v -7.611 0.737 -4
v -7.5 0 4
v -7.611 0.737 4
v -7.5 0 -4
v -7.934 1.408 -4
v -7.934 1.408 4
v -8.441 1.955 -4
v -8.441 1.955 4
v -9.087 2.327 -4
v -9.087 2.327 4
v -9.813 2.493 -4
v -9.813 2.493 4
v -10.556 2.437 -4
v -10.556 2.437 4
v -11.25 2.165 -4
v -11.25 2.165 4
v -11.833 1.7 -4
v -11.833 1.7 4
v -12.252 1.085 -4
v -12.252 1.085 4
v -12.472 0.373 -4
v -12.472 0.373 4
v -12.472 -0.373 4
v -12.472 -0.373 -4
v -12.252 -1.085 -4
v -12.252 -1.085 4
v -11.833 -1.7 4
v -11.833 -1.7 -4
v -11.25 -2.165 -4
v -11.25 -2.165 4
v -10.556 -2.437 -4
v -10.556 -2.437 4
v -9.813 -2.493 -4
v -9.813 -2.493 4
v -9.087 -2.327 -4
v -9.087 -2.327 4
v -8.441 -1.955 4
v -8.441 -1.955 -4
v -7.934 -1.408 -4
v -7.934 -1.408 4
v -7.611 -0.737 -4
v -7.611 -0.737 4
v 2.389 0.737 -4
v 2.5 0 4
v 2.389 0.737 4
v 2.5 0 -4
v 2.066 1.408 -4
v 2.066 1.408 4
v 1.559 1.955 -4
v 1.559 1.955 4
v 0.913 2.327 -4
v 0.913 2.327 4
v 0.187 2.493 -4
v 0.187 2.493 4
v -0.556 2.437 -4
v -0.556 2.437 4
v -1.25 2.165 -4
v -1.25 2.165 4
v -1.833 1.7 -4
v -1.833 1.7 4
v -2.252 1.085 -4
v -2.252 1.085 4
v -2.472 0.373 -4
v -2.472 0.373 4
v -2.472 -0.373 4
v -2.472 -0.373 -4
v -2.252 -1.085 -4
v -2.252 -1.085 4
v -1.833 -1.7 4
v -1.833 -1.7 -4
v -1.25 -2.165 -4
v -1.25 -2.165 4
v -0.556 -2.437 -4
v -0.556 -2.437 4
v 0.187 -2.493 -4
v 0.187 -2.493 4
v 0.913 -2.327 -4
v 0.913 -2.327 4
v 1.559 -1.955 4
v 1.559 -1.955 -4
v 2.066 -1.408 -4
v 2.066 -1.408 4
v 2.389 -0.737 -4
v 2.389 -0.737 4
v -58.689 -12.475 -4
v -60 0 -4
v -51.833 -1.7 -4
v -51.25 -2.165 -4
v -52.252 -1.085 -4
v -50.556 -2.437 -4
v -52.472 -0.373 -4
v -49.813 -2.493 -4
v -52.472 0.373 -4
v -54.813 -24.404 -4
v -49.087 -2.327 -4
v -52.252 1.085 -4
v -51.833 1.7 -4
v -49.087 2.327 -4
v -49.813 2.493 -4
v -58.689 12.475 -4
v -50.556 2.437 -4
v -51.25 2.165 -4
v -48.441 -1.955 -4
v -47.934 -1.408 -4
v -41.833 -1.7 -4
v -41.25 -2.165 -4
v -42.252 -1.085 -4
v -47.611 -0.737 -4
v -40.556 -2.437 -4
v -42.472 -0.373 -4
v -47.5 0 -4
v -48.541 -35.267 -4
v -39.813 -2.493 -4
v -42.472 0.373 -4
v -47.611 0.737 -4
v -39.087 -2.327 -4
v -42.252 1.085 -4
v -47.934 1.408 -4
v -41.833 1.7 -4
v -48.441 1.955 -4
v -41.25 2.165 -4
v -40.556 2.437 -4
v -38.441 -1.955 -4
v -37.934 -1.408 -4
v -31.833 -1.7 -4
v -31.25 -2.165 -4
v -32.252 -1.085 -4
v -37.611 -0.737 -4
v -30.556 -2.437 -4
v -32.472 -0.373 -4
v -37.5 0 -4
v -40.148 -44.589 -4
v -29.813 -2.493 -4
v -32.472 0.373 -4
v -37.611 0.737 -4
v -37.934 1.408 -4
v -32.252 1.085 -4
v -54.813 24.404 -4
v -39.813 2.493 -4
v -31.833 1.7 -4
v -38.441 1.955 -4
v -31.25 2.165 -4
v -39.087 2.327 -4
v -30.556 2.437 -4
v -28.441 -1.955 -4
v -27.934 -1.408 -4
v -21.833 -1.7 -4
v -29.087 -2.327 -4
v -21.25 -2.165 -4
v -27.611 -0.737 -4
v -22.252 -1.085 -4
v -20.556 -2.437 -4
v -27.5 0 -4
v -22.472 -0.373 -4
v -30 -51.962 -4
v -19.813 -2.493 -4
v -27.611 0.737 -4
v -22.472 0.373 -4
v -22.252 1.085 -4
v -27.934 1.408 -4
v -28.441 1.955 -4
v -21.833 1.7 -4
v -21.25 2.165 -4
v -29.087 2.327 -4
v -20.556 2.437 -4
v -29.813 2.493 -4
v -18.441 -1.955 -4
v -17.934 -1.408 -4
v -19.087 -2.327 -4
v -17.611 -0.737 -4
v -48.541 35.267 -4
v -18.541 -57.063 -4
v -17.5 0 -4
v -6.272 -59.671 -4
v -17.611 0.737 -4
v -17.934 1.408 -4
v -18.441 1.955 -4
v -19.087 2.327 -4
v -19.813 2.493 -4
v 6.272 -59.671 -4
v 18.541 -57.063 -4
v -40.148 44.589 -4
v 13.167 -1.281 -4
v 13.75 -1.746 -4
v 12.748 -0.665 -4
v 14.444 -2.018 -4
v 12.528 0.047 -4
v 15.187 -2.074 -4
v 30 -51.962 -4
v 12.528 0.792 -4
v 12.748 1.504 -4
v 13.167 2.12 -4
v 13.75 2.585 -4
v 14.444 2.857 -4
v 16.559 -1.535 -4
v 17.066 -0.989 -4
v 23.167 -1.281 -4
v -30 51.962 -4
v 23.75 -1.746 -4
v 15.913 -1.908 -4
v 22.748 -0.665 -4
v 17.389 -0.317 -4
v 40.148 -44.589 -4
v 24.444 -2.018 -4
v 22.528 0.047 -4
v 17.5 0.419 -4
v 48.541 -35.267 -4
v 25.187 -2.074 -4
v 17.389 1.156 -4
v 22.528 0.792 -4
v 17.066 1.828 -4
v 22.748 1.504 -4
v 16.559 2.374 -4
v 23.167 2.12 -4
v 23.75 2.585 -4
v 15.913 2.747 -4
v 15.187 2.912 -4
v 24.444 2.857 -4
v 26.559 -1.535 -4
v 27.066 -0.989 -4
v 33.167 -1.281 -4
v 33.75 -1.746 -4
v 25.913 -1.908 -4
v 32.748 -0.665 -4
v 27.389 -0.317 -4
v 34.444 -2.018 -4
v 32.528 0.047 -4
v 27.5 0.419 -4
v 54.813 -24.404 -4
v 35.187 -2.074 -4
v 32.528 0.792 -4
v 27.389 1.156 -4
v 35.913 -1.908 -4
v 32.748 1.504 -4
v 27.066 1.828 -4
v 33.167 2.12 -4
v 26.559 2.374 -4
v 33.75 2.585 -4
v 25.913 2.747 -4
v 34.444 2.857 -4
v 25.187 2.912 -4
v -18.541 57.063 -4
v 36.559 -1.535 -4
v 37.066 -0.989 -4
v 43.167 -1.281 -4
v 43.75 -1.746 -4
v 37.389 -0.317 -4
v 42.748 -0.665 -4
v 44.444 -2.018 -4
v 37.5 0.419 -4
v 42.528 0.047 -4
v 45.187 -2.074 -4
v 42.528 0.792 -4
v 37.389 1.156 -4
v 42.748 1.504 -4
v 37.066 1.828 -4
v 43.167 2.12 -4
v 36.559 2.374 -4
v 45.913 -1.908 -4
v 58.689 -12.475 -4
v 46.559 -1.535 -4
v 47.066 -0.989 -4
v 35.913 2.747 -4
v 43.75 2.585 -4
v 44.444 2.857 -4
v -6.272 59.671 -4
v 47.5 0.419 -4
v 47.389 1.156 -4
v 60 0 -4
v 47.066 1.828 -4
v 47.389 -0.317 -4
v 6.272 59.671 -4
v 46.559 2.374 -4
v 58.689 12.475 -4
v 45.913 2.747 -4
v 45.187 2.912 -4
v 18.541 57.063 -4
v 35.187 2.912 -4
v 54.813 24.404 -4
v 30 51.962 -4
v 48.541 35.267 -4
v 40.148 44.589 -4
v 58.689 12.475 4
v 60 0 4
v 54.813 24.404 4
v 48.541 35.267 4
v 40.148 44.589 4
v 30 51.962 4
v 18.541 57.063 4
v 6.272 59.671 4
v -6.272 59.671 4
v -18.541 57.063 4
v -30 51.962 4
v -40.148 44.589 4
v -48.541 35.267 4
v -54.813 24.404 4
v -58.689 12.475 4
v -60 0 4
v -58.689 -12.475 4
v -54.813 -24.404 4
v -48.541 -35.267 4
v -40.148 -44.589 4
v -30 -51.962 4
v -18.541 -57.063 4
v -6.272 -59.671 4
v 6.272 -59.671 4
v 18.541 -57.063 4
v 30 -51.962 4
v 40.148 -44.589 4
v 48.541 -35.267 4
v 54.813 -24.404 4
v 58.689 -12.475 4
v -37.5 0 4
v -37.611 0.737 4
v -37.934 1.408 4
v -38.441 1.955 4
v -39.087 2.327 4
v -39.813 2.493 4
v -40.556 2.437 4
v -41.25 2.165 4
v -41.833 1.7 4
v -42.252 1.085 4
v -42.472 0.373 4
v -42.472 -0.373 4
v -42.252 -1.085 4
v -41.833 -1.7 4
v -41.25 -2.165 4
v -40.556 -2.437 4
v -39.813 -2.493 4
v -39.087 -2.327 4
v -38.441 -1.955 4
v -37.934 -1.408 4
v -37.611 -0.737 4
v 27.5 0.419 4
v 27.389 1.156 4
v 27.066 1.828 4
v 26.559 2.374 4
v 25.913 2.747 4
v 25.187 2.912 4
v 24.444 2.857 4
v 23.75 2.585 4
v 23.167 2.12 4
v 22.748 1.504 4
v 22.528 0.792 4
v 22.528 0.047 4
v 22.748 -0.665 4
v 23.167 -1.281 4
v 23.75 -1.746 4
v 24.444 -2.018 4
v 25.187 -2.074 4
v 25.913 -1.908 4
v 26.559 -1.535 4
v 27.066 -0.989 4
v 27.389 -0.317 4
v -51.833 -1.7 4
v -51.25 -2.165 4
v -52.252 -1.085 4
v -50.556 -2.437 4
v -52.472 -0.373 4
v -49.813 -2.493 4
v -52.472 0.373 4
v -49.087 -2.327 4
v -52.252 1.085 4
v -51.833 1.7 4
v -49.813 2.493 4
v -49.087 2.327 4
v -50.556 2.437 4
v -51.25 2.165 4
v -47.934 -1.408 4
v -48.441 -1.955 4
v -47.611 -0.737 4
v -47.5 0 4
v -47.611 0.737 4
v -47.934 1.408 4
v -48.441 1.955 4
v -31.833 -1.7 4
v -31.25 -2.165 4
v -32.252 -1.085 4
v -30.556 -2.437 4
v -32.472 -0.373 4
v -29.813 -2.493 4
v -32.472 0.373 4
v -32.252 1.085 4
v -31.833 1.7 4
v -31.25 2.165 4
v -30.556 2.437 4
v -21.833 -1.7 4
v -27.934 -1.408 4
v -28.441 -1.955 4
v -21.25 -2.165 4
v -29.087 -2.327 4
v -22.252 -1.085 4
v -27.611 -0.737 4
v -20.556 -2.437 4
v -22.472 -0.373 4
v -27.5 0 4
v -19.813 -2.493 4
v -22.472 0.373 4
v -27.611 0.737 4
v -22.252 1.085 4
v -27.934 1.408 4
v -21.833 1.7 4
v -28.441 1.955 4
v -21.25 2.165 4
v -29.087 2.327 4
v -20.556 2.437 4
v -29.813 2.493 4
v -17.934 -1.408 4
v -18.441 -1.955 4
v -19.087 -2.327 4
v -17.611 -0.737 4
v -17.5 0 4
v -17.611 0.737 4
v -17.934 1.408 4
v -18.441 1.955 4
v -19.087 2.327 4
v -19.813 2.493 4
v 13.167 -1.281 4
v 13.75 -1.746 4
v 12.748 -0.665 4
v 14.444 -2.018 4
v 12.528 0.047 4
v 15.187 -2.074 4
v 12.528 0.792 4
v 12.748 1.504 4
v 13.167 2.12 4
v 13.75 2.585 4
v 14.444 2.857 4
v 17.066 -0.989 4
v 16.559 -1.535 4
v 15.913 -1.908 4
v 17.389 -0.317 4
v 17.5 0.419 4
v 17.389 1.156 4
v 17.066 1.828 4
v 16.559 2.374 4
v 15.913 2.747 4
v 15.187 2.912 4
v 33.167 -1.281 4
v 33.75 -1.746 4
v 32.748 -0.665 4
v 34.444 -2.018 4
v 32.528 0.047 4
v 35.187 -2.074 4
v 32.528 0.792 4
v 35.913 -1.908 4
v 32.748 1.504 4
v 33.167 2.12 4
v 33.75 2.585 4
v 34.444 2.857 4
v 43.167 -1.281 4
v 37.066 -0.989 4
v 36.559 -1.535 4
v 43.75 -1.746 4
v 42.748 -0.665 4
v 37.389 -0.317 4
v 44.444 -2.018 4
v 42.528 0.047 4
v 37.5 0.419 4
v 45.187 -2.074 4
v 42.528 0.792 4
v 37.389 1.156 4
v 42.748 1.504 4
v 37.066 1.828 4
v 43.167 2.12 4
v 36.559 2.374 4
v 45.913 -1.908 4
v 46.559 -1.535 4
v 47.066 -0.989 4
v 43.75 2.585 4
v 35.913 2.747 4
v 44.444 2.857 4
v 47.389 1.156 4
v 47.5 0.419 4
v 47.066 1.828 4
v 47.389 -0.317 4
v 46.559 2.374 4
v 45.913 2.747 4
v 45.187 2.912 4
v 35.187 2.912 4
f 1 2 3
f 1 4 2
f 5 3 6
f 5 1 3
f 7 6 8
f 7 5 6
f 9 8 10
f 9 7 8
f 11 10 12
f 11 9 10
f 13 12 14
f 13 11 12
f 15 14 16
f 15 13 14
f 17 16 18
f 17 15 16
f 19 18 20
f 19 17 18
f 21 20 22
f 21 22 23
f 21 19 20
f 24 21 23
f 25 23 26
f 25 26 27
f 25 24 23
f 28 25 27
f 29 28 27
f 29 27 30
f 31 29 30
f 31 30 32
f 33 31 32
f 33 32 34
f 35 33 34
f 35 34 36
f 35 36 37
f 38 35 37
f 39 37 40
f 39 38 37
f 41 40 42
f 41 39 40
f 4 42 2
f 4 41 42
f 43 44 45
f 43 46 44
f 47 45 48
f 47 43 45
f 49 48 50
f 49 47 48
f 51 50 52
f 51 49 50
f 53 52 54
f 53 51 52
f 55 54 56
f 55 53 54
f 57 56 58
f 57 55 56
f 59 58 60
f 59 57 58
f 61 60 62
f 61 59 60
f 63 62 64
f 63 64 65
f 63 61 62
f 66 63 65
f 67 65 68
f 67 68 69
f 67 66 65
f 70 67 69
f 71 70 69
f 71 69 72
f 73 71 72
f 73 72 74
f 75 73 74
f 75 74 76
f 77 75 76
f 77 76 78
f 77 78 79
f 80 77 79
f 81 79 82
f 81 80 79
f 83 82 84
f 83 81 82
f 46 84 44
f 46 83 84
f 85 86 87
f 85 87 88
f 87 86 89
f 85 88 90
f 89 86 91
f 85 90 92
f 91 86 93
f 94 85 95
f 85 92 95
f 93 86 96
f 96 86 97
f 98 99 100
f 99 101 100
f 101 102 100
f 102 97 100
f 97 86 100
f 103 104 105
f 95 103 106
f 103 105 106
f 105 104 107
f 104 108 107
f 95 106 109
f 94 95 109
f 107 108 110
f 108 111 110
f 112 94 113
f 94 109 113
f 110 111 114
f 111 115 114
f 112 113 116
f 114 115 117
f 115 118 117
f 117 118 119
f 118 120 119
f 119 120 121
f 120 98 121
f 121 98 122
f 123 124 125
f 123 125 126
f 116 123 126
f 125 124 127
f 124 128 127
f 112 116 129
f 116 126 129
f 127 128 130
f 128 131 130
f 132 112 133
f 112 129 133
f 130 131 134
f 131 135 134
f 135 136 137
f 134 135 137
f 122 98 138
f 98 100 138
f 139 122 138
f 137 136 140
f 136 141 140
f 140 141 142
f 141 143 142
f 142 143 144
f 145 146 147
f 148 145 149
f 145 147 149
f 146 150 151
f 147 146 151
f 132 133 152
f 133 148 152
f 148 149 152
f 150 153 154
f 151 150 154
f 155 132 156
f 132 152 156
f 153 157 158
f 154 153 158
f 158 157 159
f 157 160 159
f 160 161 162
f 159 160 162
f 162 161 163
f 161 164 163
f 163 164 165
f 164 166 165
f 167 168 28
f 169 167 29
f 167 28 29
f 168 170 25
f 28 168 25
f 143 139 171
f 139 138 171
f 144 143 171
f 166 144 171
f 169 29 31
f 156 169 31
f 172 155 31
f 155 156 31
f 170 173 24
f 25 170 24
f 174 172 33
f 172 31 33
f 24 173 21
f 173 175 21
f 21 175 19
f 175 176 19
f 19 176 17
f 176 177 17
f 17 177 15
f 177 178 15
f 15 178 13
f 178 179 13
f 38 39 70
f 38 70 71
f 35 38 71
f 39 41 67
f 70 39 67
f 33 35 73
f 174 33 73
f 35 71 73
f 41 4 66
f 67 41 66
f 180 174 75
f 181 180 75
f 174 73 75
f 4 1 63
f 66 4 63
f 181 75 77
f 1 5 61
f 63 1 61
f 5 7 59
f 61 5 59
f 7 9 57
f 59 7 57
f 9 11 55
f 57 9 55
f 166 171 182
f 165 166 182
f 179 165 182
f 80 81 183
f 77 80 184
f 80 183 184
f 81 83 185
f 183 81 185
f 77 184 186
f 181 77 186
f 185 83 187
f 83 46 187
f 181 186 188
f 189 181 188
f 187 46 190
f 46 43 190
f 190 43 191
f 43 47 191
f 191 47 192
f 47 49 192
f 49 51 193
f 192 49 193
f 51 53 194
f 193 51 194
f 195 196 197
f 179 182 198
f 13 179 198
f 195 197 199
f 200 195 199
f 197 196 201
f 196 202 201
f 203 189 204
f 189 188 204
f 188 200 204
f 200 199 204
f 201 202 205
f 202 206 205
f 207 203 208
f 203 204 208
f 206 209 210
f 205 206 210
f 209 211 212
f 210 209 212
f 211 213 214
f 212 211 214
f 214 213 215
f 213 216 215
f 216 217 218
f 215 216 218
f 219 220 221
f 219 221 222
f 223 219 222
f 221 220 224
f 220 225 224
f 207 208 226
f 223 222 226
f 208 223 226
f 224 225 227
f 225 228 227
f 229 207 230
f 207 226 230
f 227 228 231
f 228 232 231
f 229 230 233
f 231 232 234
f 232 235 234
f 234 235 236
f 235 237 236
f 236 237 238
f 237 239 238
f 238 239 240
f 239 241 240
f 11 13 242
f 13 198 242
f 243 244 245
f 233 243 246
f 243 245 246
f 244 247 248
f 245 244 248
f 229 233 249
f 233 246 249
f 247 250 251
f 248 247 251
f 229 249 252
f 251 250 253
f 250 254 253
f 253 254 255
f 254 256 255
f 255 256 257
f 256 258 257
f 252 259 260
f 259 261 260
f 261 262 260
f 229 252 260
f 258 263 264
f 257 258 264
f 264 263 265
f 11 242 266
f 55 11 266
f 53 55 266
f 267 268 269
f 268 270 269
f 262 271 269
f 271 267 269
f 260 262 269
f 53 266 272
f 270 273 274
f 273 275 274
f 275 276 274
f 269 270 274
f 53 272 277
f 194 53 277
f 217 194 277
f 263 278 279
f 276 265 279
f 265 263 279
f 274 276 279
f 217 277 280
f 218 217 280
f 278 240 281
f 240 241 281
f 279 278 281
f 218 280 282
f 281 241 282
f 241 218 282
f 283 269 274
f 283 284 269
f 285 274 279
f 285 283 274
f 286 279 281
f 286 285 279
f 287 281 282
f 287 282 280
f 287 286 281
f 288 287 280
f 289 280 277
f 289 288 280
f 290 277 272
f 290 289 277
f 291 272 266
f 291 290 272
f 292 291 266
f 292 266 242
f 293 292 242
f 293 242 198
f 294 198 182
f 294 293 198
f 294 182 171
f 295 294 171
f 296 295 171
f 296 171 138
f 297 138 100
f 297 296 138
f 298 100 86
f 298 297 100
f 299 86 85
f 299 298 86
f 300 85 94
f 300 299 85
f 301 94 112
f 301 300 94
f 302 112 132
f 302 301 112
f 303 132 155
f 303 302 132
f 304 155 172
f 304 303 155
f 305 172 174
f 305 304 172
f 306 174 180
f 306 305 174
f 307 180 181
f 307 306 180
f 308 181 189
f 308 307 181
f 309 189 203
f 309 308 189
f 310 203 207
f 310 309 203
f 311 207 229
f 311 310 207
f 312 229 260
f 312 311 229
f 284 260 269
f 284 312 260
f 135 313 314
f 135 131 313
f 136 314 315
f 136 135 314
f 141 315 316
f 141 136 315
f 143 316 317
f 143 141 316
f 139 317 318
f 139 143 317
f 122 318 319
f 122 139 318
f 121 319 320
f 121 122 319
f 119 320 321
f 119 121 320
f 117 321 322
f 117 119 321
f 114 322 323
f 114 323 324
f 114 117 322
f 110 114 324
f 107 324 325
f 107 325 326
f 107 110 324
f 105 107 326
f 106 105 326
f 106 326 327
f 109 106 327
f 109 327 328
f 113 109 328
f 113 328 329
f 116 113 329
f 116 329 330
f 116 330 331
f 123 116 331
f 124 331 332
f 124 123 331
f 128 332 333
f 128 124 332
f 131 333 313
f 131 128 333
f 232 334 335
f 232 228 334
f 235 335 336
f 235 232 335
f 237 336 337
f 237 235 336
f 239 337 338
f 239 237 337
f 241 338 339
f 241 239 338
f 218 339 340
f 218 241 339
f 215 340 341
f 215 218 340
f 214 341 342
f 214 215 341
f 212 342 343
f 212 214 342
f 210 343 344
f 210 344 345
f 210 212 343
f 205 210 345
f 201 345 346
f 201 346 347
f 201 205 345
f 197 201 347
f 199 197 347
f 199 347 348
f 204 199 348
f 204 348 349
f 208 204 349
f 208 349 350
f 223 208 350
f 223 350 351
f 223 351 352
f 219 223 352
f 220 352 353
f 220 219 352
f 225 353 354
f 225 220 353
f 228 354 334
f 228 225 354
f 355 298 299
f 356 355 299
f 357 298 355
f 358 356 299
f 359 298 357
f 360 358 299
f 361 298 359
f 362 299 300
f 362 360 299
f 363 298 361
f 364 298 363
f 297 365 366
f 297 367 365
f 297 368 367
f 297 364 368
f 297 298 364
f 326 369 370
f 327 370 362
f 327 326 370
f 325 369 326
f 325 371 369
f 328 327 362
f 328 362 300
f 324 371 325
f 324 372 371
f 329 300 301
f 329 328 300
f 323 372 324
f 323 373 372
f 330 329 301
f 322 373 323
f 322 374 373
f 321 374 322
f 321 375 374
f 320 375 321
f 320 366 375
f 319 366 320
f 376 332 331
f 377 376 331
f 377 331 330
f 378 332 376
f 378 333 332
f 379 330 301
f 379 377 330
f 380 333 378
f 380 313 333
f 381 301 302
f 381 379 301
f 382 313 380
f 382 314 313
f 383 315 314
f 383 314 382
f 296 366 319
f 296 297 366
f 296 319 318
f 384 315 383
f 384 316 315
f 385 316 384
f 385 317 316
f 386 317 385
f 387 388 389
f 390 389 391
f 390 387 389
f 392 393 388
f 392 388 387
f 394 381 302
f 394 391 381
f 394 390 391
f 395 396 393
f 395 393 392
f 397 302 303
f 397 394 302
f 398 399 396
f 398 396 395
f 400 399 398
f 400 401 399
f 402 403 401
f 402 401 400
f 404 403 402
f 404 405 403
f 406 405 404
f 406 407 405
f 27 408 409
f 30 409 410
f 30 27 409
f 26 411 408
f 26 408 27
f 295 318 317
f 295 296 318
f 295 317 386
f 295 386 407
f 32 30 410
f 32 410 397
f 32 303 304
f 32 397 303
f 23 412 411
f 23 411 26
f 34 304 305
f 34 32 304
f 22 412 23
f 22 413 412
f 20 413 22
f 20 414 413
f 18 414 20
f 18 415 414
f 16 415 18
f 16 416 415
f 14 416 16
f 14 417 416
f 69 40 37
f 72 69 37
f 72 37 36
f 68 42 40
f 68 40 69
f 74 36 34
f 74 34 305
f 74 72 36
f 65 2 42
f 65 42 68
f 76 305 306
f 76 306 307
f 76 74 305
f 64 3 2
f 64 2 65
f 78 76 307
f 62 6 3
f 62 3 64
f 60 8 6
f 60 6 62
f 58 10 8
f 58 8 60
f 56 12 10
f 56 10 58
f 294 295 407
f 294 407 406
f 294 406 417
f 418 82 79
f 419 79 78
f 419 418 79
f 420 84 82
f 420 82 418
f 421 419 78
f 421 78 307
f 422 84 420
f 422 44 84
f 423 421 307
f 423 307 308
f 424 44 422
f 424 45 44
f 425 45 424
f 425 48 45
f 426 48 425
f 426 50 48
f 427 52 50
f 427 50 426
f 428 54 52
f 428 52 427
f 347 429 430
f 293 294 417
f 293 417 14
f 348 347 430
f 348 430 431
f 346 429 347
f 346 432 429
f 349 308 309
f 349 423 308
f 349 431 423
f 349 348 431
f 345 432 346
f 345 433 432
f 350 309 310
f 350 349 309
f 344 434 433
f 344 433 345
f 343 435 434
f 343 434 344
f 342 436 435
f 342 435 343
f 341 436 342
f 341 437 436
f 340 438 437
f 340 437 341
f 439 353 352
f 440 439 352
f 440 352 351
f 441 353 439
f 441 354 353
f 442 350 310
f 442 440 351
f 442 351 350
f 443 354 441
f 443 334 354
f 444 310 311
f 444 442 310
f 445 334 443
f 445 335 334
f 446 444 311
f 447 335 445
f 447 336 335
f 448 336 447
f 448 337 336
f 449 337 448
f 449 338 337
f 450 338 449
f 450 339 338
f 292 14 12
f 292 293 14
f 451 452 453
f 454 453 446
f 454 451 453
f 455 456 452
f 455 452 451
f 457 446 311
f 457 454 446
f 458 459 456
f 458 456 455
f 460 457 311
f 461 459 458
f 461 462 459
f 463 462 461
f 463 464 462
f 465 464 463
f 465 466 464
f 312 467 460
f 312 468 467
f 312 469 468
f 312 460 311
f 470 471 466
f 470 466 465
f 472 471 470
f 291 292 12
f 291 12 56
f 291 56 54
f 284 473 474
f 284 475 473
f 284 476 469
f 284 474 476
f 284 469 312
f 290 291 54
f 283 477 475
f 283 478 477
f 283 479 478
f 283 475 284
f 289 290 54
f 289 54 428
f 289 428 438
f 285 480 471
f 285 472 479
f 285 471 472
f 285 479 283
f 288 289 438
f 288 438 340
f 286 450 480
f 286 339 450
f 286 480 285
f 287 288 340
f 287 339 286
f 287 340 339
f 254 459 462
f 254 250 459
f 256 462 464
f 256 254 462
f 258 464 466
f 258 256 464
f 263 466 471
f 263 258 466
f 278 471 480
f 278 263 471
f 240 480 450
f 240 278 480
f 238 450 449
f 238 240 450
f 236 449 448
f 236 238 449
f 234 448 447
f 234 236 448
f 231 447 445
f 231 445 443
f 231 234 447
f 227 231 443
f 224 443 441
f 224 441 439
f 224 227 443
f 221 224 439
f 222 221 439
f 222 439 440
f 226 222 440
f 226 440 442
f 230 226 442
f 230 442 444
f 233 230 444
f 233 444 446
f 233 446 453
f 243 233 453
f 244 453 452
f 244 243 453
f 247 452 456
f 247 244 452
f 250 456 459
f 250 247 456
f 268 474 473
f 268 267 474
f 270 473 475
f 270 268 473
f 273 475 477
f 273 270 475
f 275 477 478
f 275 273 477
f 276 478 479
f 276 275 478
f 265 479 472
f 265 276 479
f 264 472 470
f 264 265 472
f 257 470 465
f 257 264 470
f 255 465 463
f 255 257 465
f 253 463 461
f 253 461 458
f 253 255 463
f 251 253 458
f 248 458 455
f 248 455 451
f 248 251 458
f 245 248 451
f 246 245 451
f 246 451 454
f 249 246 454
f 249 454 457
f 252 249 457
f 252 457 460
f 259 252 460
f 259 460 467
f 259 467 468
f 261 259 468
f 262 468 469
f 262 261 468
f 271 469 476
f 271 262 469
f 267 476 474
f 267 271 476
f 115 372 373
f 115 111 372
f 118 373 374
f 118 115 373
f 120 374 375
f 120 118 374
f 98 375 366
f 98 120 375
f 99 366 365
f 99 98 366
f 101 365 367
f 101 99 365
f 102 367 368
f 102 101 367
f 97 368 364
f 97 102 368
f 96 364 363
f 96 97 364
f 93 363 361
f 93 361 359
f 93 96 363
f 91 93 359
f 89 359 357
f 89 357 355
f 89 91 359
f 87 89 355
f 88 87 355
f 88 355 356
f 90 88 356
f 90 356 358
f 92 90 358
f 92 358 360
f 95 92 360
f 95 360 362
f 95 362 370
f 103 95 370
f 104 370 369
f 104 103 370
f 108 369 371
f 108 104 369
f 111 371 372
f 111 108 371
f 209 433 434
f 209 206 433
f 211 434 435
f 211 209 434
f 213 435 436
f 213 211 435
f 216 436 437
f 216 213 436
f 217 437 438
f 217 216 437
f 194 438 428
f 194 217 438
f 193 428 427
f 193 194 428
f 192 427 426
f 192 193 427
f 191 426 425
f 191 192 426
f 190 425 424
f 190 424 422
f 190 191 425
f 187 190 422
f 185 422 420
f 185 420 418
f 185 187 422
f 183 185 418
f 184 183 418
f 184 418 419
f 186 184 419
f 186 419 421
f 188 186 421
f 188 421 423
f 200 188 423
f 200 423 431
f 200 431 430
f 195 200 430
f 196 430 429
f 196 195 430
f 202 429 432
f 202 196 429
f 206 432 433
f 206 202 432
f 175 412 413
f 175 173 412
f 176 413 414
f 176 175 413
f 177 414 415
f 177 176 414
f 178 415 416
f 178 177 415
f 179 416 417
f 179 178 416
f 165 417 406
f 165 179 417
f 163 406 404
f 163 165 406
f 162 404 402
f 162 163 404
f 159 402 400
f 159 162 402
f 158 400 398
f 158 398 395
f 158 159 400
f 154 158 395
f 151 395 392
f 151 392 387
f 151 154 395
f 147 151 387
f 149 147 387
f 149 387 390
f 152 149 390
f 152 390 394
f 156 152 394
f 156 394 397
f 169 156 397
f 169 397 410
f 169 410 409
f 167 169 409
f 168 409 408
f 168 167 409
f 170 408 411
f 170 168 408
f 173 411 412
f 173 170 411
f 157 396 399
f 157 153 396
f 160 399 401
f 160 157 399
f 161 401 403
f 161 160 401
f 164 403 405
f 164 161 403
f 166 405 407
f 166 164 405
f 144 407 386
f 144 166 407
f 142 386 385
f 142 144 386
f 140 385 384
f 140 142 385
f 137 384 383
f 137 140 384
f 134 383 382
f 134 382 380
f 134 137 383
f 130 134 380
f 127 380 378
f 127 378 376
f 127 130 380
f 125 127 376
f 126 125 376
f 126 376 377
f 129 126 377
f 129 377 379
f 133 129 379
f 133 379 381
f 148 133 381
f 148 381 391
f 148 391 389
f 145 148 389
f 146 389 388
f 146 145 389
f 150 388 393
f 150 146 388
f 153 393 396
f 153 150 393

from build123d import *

# Parameters (mm, degrees)
SKETCH1_R           = 60
SKETCH1_R_2         = 2.5
BOSS_EXTRUDE1_DEPTH = 4


with BuildPart() as part:
    # Sketch1 → Boss-Extrude1 (new, symmetric)
    with BuildSketch(Plane.XY):
        Circle(SKETCH1_R)
        Circle(SKETCH1_R_2, mode=Mode.SUBTRACT)
        with Locations((-10, 0)):
            Circle(SKETCH1_R_2, mode=Mode.SUBTRACT)
        with Locations((-20, 0)):
            Circle(SKETCH1_R_2, mode=Mode.SUBTRACT)
        with Locations((-30, 0)):
            Circle(SKETCH1_R_2, mode=Mode.SUBTRACT)
        with Locations((-40, 0)):
            Circle(SKETCH1_R_2, mode=Mode.SUBTRACT)
        with Locations((-50, 0)):
            Circle(SKETCH1_R_2, mode=Mode.SUBTRACT)
        with Locations((45, 0.419447228)):
            Circle(SKETCH1_R_2, mode=Mode.SUBTRACT)
        with Locations((35, 0.419447228)):
            Circle(SKETCH1_R_2, mode=Mode.SUBTRACT)
        with Locations((25, 0.419447228)):
            Circle(SKETCH1_R_2, mode=Mode.SUBTRACT)
        with Locations((15, 0.419447228)):
            Circle(SKETCH1_R_2, mode=Mode.SUBTRACT)
    extrude(amount=BOSS_EXTRUDE1_DEPTH, both=True)


solid = part.part
